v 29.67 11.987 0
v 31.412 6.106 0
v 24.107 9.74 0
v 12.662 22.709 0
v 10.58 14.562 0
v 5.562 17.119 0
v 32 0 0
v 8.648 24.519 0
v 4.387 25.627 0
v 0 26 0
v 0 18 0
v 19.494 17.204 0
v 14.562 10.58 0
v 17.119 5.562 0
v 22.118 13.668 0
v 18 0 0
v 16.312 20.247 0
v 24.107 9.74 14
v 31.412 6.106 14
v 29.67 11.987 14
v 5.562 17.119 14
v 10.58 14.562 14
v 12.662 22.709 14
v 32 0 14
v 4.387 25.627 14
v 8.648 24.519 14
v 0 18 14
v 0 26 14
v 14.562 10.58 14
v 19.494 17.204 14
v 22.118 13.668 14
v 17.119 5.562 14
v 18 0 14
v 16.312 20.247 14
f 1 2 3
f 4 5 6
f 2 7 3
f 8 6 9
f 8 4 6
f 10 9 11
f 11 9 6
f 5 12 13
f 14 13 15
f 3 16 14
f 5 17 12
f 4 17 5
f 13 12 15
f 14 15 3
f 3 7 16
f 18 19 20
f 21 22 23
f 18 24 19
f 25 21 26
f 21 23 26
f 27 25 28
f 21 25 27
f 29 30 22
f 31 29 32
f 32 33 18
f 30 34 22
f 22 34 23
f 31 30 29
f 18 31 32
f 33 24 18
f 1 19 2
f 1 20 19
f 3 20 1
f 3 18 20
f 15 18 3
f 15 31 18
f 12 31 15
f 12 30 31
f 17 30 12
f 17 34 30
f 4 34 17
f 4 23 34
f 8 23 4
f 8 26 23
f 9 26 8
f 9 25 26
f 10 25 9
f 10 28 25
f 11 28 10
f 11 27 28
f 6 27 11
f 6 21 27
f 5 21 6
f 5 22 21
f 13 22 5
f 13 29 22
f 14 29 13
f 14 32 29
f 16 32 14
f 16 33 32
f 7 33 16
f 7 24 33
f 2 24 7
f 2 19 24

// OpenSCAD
$fn = 32;

// ----------------------------------------------------------------------
// Arc stop: segment, 14 mm thick
// ----------------------------------------------------------------------

// --- parameters (mm) ---
profile_height = 14;      // extrusion height
profile_points = 17;      // points of the closed outline

profile = [[32, 0], [31.412, 6.106], [29.67, 11.987], [24.107, 9.74], [22.118, 13.668], [19.494, 17.204], [16.312, 20.247], [12.662, 22.709], [8.648, 24.519], [4.387, 25.627], [0, 26], [0, 18], [5.562, 17.119], [10.58, 14.562], [14.562, 10.58], [17.119, 5.562], [18, 0]];  // single closed polygon, 17 points, counter clockwise

// --- the one profile operation ---
linear_extrude(height = profile_height) polygon(points = profile);
